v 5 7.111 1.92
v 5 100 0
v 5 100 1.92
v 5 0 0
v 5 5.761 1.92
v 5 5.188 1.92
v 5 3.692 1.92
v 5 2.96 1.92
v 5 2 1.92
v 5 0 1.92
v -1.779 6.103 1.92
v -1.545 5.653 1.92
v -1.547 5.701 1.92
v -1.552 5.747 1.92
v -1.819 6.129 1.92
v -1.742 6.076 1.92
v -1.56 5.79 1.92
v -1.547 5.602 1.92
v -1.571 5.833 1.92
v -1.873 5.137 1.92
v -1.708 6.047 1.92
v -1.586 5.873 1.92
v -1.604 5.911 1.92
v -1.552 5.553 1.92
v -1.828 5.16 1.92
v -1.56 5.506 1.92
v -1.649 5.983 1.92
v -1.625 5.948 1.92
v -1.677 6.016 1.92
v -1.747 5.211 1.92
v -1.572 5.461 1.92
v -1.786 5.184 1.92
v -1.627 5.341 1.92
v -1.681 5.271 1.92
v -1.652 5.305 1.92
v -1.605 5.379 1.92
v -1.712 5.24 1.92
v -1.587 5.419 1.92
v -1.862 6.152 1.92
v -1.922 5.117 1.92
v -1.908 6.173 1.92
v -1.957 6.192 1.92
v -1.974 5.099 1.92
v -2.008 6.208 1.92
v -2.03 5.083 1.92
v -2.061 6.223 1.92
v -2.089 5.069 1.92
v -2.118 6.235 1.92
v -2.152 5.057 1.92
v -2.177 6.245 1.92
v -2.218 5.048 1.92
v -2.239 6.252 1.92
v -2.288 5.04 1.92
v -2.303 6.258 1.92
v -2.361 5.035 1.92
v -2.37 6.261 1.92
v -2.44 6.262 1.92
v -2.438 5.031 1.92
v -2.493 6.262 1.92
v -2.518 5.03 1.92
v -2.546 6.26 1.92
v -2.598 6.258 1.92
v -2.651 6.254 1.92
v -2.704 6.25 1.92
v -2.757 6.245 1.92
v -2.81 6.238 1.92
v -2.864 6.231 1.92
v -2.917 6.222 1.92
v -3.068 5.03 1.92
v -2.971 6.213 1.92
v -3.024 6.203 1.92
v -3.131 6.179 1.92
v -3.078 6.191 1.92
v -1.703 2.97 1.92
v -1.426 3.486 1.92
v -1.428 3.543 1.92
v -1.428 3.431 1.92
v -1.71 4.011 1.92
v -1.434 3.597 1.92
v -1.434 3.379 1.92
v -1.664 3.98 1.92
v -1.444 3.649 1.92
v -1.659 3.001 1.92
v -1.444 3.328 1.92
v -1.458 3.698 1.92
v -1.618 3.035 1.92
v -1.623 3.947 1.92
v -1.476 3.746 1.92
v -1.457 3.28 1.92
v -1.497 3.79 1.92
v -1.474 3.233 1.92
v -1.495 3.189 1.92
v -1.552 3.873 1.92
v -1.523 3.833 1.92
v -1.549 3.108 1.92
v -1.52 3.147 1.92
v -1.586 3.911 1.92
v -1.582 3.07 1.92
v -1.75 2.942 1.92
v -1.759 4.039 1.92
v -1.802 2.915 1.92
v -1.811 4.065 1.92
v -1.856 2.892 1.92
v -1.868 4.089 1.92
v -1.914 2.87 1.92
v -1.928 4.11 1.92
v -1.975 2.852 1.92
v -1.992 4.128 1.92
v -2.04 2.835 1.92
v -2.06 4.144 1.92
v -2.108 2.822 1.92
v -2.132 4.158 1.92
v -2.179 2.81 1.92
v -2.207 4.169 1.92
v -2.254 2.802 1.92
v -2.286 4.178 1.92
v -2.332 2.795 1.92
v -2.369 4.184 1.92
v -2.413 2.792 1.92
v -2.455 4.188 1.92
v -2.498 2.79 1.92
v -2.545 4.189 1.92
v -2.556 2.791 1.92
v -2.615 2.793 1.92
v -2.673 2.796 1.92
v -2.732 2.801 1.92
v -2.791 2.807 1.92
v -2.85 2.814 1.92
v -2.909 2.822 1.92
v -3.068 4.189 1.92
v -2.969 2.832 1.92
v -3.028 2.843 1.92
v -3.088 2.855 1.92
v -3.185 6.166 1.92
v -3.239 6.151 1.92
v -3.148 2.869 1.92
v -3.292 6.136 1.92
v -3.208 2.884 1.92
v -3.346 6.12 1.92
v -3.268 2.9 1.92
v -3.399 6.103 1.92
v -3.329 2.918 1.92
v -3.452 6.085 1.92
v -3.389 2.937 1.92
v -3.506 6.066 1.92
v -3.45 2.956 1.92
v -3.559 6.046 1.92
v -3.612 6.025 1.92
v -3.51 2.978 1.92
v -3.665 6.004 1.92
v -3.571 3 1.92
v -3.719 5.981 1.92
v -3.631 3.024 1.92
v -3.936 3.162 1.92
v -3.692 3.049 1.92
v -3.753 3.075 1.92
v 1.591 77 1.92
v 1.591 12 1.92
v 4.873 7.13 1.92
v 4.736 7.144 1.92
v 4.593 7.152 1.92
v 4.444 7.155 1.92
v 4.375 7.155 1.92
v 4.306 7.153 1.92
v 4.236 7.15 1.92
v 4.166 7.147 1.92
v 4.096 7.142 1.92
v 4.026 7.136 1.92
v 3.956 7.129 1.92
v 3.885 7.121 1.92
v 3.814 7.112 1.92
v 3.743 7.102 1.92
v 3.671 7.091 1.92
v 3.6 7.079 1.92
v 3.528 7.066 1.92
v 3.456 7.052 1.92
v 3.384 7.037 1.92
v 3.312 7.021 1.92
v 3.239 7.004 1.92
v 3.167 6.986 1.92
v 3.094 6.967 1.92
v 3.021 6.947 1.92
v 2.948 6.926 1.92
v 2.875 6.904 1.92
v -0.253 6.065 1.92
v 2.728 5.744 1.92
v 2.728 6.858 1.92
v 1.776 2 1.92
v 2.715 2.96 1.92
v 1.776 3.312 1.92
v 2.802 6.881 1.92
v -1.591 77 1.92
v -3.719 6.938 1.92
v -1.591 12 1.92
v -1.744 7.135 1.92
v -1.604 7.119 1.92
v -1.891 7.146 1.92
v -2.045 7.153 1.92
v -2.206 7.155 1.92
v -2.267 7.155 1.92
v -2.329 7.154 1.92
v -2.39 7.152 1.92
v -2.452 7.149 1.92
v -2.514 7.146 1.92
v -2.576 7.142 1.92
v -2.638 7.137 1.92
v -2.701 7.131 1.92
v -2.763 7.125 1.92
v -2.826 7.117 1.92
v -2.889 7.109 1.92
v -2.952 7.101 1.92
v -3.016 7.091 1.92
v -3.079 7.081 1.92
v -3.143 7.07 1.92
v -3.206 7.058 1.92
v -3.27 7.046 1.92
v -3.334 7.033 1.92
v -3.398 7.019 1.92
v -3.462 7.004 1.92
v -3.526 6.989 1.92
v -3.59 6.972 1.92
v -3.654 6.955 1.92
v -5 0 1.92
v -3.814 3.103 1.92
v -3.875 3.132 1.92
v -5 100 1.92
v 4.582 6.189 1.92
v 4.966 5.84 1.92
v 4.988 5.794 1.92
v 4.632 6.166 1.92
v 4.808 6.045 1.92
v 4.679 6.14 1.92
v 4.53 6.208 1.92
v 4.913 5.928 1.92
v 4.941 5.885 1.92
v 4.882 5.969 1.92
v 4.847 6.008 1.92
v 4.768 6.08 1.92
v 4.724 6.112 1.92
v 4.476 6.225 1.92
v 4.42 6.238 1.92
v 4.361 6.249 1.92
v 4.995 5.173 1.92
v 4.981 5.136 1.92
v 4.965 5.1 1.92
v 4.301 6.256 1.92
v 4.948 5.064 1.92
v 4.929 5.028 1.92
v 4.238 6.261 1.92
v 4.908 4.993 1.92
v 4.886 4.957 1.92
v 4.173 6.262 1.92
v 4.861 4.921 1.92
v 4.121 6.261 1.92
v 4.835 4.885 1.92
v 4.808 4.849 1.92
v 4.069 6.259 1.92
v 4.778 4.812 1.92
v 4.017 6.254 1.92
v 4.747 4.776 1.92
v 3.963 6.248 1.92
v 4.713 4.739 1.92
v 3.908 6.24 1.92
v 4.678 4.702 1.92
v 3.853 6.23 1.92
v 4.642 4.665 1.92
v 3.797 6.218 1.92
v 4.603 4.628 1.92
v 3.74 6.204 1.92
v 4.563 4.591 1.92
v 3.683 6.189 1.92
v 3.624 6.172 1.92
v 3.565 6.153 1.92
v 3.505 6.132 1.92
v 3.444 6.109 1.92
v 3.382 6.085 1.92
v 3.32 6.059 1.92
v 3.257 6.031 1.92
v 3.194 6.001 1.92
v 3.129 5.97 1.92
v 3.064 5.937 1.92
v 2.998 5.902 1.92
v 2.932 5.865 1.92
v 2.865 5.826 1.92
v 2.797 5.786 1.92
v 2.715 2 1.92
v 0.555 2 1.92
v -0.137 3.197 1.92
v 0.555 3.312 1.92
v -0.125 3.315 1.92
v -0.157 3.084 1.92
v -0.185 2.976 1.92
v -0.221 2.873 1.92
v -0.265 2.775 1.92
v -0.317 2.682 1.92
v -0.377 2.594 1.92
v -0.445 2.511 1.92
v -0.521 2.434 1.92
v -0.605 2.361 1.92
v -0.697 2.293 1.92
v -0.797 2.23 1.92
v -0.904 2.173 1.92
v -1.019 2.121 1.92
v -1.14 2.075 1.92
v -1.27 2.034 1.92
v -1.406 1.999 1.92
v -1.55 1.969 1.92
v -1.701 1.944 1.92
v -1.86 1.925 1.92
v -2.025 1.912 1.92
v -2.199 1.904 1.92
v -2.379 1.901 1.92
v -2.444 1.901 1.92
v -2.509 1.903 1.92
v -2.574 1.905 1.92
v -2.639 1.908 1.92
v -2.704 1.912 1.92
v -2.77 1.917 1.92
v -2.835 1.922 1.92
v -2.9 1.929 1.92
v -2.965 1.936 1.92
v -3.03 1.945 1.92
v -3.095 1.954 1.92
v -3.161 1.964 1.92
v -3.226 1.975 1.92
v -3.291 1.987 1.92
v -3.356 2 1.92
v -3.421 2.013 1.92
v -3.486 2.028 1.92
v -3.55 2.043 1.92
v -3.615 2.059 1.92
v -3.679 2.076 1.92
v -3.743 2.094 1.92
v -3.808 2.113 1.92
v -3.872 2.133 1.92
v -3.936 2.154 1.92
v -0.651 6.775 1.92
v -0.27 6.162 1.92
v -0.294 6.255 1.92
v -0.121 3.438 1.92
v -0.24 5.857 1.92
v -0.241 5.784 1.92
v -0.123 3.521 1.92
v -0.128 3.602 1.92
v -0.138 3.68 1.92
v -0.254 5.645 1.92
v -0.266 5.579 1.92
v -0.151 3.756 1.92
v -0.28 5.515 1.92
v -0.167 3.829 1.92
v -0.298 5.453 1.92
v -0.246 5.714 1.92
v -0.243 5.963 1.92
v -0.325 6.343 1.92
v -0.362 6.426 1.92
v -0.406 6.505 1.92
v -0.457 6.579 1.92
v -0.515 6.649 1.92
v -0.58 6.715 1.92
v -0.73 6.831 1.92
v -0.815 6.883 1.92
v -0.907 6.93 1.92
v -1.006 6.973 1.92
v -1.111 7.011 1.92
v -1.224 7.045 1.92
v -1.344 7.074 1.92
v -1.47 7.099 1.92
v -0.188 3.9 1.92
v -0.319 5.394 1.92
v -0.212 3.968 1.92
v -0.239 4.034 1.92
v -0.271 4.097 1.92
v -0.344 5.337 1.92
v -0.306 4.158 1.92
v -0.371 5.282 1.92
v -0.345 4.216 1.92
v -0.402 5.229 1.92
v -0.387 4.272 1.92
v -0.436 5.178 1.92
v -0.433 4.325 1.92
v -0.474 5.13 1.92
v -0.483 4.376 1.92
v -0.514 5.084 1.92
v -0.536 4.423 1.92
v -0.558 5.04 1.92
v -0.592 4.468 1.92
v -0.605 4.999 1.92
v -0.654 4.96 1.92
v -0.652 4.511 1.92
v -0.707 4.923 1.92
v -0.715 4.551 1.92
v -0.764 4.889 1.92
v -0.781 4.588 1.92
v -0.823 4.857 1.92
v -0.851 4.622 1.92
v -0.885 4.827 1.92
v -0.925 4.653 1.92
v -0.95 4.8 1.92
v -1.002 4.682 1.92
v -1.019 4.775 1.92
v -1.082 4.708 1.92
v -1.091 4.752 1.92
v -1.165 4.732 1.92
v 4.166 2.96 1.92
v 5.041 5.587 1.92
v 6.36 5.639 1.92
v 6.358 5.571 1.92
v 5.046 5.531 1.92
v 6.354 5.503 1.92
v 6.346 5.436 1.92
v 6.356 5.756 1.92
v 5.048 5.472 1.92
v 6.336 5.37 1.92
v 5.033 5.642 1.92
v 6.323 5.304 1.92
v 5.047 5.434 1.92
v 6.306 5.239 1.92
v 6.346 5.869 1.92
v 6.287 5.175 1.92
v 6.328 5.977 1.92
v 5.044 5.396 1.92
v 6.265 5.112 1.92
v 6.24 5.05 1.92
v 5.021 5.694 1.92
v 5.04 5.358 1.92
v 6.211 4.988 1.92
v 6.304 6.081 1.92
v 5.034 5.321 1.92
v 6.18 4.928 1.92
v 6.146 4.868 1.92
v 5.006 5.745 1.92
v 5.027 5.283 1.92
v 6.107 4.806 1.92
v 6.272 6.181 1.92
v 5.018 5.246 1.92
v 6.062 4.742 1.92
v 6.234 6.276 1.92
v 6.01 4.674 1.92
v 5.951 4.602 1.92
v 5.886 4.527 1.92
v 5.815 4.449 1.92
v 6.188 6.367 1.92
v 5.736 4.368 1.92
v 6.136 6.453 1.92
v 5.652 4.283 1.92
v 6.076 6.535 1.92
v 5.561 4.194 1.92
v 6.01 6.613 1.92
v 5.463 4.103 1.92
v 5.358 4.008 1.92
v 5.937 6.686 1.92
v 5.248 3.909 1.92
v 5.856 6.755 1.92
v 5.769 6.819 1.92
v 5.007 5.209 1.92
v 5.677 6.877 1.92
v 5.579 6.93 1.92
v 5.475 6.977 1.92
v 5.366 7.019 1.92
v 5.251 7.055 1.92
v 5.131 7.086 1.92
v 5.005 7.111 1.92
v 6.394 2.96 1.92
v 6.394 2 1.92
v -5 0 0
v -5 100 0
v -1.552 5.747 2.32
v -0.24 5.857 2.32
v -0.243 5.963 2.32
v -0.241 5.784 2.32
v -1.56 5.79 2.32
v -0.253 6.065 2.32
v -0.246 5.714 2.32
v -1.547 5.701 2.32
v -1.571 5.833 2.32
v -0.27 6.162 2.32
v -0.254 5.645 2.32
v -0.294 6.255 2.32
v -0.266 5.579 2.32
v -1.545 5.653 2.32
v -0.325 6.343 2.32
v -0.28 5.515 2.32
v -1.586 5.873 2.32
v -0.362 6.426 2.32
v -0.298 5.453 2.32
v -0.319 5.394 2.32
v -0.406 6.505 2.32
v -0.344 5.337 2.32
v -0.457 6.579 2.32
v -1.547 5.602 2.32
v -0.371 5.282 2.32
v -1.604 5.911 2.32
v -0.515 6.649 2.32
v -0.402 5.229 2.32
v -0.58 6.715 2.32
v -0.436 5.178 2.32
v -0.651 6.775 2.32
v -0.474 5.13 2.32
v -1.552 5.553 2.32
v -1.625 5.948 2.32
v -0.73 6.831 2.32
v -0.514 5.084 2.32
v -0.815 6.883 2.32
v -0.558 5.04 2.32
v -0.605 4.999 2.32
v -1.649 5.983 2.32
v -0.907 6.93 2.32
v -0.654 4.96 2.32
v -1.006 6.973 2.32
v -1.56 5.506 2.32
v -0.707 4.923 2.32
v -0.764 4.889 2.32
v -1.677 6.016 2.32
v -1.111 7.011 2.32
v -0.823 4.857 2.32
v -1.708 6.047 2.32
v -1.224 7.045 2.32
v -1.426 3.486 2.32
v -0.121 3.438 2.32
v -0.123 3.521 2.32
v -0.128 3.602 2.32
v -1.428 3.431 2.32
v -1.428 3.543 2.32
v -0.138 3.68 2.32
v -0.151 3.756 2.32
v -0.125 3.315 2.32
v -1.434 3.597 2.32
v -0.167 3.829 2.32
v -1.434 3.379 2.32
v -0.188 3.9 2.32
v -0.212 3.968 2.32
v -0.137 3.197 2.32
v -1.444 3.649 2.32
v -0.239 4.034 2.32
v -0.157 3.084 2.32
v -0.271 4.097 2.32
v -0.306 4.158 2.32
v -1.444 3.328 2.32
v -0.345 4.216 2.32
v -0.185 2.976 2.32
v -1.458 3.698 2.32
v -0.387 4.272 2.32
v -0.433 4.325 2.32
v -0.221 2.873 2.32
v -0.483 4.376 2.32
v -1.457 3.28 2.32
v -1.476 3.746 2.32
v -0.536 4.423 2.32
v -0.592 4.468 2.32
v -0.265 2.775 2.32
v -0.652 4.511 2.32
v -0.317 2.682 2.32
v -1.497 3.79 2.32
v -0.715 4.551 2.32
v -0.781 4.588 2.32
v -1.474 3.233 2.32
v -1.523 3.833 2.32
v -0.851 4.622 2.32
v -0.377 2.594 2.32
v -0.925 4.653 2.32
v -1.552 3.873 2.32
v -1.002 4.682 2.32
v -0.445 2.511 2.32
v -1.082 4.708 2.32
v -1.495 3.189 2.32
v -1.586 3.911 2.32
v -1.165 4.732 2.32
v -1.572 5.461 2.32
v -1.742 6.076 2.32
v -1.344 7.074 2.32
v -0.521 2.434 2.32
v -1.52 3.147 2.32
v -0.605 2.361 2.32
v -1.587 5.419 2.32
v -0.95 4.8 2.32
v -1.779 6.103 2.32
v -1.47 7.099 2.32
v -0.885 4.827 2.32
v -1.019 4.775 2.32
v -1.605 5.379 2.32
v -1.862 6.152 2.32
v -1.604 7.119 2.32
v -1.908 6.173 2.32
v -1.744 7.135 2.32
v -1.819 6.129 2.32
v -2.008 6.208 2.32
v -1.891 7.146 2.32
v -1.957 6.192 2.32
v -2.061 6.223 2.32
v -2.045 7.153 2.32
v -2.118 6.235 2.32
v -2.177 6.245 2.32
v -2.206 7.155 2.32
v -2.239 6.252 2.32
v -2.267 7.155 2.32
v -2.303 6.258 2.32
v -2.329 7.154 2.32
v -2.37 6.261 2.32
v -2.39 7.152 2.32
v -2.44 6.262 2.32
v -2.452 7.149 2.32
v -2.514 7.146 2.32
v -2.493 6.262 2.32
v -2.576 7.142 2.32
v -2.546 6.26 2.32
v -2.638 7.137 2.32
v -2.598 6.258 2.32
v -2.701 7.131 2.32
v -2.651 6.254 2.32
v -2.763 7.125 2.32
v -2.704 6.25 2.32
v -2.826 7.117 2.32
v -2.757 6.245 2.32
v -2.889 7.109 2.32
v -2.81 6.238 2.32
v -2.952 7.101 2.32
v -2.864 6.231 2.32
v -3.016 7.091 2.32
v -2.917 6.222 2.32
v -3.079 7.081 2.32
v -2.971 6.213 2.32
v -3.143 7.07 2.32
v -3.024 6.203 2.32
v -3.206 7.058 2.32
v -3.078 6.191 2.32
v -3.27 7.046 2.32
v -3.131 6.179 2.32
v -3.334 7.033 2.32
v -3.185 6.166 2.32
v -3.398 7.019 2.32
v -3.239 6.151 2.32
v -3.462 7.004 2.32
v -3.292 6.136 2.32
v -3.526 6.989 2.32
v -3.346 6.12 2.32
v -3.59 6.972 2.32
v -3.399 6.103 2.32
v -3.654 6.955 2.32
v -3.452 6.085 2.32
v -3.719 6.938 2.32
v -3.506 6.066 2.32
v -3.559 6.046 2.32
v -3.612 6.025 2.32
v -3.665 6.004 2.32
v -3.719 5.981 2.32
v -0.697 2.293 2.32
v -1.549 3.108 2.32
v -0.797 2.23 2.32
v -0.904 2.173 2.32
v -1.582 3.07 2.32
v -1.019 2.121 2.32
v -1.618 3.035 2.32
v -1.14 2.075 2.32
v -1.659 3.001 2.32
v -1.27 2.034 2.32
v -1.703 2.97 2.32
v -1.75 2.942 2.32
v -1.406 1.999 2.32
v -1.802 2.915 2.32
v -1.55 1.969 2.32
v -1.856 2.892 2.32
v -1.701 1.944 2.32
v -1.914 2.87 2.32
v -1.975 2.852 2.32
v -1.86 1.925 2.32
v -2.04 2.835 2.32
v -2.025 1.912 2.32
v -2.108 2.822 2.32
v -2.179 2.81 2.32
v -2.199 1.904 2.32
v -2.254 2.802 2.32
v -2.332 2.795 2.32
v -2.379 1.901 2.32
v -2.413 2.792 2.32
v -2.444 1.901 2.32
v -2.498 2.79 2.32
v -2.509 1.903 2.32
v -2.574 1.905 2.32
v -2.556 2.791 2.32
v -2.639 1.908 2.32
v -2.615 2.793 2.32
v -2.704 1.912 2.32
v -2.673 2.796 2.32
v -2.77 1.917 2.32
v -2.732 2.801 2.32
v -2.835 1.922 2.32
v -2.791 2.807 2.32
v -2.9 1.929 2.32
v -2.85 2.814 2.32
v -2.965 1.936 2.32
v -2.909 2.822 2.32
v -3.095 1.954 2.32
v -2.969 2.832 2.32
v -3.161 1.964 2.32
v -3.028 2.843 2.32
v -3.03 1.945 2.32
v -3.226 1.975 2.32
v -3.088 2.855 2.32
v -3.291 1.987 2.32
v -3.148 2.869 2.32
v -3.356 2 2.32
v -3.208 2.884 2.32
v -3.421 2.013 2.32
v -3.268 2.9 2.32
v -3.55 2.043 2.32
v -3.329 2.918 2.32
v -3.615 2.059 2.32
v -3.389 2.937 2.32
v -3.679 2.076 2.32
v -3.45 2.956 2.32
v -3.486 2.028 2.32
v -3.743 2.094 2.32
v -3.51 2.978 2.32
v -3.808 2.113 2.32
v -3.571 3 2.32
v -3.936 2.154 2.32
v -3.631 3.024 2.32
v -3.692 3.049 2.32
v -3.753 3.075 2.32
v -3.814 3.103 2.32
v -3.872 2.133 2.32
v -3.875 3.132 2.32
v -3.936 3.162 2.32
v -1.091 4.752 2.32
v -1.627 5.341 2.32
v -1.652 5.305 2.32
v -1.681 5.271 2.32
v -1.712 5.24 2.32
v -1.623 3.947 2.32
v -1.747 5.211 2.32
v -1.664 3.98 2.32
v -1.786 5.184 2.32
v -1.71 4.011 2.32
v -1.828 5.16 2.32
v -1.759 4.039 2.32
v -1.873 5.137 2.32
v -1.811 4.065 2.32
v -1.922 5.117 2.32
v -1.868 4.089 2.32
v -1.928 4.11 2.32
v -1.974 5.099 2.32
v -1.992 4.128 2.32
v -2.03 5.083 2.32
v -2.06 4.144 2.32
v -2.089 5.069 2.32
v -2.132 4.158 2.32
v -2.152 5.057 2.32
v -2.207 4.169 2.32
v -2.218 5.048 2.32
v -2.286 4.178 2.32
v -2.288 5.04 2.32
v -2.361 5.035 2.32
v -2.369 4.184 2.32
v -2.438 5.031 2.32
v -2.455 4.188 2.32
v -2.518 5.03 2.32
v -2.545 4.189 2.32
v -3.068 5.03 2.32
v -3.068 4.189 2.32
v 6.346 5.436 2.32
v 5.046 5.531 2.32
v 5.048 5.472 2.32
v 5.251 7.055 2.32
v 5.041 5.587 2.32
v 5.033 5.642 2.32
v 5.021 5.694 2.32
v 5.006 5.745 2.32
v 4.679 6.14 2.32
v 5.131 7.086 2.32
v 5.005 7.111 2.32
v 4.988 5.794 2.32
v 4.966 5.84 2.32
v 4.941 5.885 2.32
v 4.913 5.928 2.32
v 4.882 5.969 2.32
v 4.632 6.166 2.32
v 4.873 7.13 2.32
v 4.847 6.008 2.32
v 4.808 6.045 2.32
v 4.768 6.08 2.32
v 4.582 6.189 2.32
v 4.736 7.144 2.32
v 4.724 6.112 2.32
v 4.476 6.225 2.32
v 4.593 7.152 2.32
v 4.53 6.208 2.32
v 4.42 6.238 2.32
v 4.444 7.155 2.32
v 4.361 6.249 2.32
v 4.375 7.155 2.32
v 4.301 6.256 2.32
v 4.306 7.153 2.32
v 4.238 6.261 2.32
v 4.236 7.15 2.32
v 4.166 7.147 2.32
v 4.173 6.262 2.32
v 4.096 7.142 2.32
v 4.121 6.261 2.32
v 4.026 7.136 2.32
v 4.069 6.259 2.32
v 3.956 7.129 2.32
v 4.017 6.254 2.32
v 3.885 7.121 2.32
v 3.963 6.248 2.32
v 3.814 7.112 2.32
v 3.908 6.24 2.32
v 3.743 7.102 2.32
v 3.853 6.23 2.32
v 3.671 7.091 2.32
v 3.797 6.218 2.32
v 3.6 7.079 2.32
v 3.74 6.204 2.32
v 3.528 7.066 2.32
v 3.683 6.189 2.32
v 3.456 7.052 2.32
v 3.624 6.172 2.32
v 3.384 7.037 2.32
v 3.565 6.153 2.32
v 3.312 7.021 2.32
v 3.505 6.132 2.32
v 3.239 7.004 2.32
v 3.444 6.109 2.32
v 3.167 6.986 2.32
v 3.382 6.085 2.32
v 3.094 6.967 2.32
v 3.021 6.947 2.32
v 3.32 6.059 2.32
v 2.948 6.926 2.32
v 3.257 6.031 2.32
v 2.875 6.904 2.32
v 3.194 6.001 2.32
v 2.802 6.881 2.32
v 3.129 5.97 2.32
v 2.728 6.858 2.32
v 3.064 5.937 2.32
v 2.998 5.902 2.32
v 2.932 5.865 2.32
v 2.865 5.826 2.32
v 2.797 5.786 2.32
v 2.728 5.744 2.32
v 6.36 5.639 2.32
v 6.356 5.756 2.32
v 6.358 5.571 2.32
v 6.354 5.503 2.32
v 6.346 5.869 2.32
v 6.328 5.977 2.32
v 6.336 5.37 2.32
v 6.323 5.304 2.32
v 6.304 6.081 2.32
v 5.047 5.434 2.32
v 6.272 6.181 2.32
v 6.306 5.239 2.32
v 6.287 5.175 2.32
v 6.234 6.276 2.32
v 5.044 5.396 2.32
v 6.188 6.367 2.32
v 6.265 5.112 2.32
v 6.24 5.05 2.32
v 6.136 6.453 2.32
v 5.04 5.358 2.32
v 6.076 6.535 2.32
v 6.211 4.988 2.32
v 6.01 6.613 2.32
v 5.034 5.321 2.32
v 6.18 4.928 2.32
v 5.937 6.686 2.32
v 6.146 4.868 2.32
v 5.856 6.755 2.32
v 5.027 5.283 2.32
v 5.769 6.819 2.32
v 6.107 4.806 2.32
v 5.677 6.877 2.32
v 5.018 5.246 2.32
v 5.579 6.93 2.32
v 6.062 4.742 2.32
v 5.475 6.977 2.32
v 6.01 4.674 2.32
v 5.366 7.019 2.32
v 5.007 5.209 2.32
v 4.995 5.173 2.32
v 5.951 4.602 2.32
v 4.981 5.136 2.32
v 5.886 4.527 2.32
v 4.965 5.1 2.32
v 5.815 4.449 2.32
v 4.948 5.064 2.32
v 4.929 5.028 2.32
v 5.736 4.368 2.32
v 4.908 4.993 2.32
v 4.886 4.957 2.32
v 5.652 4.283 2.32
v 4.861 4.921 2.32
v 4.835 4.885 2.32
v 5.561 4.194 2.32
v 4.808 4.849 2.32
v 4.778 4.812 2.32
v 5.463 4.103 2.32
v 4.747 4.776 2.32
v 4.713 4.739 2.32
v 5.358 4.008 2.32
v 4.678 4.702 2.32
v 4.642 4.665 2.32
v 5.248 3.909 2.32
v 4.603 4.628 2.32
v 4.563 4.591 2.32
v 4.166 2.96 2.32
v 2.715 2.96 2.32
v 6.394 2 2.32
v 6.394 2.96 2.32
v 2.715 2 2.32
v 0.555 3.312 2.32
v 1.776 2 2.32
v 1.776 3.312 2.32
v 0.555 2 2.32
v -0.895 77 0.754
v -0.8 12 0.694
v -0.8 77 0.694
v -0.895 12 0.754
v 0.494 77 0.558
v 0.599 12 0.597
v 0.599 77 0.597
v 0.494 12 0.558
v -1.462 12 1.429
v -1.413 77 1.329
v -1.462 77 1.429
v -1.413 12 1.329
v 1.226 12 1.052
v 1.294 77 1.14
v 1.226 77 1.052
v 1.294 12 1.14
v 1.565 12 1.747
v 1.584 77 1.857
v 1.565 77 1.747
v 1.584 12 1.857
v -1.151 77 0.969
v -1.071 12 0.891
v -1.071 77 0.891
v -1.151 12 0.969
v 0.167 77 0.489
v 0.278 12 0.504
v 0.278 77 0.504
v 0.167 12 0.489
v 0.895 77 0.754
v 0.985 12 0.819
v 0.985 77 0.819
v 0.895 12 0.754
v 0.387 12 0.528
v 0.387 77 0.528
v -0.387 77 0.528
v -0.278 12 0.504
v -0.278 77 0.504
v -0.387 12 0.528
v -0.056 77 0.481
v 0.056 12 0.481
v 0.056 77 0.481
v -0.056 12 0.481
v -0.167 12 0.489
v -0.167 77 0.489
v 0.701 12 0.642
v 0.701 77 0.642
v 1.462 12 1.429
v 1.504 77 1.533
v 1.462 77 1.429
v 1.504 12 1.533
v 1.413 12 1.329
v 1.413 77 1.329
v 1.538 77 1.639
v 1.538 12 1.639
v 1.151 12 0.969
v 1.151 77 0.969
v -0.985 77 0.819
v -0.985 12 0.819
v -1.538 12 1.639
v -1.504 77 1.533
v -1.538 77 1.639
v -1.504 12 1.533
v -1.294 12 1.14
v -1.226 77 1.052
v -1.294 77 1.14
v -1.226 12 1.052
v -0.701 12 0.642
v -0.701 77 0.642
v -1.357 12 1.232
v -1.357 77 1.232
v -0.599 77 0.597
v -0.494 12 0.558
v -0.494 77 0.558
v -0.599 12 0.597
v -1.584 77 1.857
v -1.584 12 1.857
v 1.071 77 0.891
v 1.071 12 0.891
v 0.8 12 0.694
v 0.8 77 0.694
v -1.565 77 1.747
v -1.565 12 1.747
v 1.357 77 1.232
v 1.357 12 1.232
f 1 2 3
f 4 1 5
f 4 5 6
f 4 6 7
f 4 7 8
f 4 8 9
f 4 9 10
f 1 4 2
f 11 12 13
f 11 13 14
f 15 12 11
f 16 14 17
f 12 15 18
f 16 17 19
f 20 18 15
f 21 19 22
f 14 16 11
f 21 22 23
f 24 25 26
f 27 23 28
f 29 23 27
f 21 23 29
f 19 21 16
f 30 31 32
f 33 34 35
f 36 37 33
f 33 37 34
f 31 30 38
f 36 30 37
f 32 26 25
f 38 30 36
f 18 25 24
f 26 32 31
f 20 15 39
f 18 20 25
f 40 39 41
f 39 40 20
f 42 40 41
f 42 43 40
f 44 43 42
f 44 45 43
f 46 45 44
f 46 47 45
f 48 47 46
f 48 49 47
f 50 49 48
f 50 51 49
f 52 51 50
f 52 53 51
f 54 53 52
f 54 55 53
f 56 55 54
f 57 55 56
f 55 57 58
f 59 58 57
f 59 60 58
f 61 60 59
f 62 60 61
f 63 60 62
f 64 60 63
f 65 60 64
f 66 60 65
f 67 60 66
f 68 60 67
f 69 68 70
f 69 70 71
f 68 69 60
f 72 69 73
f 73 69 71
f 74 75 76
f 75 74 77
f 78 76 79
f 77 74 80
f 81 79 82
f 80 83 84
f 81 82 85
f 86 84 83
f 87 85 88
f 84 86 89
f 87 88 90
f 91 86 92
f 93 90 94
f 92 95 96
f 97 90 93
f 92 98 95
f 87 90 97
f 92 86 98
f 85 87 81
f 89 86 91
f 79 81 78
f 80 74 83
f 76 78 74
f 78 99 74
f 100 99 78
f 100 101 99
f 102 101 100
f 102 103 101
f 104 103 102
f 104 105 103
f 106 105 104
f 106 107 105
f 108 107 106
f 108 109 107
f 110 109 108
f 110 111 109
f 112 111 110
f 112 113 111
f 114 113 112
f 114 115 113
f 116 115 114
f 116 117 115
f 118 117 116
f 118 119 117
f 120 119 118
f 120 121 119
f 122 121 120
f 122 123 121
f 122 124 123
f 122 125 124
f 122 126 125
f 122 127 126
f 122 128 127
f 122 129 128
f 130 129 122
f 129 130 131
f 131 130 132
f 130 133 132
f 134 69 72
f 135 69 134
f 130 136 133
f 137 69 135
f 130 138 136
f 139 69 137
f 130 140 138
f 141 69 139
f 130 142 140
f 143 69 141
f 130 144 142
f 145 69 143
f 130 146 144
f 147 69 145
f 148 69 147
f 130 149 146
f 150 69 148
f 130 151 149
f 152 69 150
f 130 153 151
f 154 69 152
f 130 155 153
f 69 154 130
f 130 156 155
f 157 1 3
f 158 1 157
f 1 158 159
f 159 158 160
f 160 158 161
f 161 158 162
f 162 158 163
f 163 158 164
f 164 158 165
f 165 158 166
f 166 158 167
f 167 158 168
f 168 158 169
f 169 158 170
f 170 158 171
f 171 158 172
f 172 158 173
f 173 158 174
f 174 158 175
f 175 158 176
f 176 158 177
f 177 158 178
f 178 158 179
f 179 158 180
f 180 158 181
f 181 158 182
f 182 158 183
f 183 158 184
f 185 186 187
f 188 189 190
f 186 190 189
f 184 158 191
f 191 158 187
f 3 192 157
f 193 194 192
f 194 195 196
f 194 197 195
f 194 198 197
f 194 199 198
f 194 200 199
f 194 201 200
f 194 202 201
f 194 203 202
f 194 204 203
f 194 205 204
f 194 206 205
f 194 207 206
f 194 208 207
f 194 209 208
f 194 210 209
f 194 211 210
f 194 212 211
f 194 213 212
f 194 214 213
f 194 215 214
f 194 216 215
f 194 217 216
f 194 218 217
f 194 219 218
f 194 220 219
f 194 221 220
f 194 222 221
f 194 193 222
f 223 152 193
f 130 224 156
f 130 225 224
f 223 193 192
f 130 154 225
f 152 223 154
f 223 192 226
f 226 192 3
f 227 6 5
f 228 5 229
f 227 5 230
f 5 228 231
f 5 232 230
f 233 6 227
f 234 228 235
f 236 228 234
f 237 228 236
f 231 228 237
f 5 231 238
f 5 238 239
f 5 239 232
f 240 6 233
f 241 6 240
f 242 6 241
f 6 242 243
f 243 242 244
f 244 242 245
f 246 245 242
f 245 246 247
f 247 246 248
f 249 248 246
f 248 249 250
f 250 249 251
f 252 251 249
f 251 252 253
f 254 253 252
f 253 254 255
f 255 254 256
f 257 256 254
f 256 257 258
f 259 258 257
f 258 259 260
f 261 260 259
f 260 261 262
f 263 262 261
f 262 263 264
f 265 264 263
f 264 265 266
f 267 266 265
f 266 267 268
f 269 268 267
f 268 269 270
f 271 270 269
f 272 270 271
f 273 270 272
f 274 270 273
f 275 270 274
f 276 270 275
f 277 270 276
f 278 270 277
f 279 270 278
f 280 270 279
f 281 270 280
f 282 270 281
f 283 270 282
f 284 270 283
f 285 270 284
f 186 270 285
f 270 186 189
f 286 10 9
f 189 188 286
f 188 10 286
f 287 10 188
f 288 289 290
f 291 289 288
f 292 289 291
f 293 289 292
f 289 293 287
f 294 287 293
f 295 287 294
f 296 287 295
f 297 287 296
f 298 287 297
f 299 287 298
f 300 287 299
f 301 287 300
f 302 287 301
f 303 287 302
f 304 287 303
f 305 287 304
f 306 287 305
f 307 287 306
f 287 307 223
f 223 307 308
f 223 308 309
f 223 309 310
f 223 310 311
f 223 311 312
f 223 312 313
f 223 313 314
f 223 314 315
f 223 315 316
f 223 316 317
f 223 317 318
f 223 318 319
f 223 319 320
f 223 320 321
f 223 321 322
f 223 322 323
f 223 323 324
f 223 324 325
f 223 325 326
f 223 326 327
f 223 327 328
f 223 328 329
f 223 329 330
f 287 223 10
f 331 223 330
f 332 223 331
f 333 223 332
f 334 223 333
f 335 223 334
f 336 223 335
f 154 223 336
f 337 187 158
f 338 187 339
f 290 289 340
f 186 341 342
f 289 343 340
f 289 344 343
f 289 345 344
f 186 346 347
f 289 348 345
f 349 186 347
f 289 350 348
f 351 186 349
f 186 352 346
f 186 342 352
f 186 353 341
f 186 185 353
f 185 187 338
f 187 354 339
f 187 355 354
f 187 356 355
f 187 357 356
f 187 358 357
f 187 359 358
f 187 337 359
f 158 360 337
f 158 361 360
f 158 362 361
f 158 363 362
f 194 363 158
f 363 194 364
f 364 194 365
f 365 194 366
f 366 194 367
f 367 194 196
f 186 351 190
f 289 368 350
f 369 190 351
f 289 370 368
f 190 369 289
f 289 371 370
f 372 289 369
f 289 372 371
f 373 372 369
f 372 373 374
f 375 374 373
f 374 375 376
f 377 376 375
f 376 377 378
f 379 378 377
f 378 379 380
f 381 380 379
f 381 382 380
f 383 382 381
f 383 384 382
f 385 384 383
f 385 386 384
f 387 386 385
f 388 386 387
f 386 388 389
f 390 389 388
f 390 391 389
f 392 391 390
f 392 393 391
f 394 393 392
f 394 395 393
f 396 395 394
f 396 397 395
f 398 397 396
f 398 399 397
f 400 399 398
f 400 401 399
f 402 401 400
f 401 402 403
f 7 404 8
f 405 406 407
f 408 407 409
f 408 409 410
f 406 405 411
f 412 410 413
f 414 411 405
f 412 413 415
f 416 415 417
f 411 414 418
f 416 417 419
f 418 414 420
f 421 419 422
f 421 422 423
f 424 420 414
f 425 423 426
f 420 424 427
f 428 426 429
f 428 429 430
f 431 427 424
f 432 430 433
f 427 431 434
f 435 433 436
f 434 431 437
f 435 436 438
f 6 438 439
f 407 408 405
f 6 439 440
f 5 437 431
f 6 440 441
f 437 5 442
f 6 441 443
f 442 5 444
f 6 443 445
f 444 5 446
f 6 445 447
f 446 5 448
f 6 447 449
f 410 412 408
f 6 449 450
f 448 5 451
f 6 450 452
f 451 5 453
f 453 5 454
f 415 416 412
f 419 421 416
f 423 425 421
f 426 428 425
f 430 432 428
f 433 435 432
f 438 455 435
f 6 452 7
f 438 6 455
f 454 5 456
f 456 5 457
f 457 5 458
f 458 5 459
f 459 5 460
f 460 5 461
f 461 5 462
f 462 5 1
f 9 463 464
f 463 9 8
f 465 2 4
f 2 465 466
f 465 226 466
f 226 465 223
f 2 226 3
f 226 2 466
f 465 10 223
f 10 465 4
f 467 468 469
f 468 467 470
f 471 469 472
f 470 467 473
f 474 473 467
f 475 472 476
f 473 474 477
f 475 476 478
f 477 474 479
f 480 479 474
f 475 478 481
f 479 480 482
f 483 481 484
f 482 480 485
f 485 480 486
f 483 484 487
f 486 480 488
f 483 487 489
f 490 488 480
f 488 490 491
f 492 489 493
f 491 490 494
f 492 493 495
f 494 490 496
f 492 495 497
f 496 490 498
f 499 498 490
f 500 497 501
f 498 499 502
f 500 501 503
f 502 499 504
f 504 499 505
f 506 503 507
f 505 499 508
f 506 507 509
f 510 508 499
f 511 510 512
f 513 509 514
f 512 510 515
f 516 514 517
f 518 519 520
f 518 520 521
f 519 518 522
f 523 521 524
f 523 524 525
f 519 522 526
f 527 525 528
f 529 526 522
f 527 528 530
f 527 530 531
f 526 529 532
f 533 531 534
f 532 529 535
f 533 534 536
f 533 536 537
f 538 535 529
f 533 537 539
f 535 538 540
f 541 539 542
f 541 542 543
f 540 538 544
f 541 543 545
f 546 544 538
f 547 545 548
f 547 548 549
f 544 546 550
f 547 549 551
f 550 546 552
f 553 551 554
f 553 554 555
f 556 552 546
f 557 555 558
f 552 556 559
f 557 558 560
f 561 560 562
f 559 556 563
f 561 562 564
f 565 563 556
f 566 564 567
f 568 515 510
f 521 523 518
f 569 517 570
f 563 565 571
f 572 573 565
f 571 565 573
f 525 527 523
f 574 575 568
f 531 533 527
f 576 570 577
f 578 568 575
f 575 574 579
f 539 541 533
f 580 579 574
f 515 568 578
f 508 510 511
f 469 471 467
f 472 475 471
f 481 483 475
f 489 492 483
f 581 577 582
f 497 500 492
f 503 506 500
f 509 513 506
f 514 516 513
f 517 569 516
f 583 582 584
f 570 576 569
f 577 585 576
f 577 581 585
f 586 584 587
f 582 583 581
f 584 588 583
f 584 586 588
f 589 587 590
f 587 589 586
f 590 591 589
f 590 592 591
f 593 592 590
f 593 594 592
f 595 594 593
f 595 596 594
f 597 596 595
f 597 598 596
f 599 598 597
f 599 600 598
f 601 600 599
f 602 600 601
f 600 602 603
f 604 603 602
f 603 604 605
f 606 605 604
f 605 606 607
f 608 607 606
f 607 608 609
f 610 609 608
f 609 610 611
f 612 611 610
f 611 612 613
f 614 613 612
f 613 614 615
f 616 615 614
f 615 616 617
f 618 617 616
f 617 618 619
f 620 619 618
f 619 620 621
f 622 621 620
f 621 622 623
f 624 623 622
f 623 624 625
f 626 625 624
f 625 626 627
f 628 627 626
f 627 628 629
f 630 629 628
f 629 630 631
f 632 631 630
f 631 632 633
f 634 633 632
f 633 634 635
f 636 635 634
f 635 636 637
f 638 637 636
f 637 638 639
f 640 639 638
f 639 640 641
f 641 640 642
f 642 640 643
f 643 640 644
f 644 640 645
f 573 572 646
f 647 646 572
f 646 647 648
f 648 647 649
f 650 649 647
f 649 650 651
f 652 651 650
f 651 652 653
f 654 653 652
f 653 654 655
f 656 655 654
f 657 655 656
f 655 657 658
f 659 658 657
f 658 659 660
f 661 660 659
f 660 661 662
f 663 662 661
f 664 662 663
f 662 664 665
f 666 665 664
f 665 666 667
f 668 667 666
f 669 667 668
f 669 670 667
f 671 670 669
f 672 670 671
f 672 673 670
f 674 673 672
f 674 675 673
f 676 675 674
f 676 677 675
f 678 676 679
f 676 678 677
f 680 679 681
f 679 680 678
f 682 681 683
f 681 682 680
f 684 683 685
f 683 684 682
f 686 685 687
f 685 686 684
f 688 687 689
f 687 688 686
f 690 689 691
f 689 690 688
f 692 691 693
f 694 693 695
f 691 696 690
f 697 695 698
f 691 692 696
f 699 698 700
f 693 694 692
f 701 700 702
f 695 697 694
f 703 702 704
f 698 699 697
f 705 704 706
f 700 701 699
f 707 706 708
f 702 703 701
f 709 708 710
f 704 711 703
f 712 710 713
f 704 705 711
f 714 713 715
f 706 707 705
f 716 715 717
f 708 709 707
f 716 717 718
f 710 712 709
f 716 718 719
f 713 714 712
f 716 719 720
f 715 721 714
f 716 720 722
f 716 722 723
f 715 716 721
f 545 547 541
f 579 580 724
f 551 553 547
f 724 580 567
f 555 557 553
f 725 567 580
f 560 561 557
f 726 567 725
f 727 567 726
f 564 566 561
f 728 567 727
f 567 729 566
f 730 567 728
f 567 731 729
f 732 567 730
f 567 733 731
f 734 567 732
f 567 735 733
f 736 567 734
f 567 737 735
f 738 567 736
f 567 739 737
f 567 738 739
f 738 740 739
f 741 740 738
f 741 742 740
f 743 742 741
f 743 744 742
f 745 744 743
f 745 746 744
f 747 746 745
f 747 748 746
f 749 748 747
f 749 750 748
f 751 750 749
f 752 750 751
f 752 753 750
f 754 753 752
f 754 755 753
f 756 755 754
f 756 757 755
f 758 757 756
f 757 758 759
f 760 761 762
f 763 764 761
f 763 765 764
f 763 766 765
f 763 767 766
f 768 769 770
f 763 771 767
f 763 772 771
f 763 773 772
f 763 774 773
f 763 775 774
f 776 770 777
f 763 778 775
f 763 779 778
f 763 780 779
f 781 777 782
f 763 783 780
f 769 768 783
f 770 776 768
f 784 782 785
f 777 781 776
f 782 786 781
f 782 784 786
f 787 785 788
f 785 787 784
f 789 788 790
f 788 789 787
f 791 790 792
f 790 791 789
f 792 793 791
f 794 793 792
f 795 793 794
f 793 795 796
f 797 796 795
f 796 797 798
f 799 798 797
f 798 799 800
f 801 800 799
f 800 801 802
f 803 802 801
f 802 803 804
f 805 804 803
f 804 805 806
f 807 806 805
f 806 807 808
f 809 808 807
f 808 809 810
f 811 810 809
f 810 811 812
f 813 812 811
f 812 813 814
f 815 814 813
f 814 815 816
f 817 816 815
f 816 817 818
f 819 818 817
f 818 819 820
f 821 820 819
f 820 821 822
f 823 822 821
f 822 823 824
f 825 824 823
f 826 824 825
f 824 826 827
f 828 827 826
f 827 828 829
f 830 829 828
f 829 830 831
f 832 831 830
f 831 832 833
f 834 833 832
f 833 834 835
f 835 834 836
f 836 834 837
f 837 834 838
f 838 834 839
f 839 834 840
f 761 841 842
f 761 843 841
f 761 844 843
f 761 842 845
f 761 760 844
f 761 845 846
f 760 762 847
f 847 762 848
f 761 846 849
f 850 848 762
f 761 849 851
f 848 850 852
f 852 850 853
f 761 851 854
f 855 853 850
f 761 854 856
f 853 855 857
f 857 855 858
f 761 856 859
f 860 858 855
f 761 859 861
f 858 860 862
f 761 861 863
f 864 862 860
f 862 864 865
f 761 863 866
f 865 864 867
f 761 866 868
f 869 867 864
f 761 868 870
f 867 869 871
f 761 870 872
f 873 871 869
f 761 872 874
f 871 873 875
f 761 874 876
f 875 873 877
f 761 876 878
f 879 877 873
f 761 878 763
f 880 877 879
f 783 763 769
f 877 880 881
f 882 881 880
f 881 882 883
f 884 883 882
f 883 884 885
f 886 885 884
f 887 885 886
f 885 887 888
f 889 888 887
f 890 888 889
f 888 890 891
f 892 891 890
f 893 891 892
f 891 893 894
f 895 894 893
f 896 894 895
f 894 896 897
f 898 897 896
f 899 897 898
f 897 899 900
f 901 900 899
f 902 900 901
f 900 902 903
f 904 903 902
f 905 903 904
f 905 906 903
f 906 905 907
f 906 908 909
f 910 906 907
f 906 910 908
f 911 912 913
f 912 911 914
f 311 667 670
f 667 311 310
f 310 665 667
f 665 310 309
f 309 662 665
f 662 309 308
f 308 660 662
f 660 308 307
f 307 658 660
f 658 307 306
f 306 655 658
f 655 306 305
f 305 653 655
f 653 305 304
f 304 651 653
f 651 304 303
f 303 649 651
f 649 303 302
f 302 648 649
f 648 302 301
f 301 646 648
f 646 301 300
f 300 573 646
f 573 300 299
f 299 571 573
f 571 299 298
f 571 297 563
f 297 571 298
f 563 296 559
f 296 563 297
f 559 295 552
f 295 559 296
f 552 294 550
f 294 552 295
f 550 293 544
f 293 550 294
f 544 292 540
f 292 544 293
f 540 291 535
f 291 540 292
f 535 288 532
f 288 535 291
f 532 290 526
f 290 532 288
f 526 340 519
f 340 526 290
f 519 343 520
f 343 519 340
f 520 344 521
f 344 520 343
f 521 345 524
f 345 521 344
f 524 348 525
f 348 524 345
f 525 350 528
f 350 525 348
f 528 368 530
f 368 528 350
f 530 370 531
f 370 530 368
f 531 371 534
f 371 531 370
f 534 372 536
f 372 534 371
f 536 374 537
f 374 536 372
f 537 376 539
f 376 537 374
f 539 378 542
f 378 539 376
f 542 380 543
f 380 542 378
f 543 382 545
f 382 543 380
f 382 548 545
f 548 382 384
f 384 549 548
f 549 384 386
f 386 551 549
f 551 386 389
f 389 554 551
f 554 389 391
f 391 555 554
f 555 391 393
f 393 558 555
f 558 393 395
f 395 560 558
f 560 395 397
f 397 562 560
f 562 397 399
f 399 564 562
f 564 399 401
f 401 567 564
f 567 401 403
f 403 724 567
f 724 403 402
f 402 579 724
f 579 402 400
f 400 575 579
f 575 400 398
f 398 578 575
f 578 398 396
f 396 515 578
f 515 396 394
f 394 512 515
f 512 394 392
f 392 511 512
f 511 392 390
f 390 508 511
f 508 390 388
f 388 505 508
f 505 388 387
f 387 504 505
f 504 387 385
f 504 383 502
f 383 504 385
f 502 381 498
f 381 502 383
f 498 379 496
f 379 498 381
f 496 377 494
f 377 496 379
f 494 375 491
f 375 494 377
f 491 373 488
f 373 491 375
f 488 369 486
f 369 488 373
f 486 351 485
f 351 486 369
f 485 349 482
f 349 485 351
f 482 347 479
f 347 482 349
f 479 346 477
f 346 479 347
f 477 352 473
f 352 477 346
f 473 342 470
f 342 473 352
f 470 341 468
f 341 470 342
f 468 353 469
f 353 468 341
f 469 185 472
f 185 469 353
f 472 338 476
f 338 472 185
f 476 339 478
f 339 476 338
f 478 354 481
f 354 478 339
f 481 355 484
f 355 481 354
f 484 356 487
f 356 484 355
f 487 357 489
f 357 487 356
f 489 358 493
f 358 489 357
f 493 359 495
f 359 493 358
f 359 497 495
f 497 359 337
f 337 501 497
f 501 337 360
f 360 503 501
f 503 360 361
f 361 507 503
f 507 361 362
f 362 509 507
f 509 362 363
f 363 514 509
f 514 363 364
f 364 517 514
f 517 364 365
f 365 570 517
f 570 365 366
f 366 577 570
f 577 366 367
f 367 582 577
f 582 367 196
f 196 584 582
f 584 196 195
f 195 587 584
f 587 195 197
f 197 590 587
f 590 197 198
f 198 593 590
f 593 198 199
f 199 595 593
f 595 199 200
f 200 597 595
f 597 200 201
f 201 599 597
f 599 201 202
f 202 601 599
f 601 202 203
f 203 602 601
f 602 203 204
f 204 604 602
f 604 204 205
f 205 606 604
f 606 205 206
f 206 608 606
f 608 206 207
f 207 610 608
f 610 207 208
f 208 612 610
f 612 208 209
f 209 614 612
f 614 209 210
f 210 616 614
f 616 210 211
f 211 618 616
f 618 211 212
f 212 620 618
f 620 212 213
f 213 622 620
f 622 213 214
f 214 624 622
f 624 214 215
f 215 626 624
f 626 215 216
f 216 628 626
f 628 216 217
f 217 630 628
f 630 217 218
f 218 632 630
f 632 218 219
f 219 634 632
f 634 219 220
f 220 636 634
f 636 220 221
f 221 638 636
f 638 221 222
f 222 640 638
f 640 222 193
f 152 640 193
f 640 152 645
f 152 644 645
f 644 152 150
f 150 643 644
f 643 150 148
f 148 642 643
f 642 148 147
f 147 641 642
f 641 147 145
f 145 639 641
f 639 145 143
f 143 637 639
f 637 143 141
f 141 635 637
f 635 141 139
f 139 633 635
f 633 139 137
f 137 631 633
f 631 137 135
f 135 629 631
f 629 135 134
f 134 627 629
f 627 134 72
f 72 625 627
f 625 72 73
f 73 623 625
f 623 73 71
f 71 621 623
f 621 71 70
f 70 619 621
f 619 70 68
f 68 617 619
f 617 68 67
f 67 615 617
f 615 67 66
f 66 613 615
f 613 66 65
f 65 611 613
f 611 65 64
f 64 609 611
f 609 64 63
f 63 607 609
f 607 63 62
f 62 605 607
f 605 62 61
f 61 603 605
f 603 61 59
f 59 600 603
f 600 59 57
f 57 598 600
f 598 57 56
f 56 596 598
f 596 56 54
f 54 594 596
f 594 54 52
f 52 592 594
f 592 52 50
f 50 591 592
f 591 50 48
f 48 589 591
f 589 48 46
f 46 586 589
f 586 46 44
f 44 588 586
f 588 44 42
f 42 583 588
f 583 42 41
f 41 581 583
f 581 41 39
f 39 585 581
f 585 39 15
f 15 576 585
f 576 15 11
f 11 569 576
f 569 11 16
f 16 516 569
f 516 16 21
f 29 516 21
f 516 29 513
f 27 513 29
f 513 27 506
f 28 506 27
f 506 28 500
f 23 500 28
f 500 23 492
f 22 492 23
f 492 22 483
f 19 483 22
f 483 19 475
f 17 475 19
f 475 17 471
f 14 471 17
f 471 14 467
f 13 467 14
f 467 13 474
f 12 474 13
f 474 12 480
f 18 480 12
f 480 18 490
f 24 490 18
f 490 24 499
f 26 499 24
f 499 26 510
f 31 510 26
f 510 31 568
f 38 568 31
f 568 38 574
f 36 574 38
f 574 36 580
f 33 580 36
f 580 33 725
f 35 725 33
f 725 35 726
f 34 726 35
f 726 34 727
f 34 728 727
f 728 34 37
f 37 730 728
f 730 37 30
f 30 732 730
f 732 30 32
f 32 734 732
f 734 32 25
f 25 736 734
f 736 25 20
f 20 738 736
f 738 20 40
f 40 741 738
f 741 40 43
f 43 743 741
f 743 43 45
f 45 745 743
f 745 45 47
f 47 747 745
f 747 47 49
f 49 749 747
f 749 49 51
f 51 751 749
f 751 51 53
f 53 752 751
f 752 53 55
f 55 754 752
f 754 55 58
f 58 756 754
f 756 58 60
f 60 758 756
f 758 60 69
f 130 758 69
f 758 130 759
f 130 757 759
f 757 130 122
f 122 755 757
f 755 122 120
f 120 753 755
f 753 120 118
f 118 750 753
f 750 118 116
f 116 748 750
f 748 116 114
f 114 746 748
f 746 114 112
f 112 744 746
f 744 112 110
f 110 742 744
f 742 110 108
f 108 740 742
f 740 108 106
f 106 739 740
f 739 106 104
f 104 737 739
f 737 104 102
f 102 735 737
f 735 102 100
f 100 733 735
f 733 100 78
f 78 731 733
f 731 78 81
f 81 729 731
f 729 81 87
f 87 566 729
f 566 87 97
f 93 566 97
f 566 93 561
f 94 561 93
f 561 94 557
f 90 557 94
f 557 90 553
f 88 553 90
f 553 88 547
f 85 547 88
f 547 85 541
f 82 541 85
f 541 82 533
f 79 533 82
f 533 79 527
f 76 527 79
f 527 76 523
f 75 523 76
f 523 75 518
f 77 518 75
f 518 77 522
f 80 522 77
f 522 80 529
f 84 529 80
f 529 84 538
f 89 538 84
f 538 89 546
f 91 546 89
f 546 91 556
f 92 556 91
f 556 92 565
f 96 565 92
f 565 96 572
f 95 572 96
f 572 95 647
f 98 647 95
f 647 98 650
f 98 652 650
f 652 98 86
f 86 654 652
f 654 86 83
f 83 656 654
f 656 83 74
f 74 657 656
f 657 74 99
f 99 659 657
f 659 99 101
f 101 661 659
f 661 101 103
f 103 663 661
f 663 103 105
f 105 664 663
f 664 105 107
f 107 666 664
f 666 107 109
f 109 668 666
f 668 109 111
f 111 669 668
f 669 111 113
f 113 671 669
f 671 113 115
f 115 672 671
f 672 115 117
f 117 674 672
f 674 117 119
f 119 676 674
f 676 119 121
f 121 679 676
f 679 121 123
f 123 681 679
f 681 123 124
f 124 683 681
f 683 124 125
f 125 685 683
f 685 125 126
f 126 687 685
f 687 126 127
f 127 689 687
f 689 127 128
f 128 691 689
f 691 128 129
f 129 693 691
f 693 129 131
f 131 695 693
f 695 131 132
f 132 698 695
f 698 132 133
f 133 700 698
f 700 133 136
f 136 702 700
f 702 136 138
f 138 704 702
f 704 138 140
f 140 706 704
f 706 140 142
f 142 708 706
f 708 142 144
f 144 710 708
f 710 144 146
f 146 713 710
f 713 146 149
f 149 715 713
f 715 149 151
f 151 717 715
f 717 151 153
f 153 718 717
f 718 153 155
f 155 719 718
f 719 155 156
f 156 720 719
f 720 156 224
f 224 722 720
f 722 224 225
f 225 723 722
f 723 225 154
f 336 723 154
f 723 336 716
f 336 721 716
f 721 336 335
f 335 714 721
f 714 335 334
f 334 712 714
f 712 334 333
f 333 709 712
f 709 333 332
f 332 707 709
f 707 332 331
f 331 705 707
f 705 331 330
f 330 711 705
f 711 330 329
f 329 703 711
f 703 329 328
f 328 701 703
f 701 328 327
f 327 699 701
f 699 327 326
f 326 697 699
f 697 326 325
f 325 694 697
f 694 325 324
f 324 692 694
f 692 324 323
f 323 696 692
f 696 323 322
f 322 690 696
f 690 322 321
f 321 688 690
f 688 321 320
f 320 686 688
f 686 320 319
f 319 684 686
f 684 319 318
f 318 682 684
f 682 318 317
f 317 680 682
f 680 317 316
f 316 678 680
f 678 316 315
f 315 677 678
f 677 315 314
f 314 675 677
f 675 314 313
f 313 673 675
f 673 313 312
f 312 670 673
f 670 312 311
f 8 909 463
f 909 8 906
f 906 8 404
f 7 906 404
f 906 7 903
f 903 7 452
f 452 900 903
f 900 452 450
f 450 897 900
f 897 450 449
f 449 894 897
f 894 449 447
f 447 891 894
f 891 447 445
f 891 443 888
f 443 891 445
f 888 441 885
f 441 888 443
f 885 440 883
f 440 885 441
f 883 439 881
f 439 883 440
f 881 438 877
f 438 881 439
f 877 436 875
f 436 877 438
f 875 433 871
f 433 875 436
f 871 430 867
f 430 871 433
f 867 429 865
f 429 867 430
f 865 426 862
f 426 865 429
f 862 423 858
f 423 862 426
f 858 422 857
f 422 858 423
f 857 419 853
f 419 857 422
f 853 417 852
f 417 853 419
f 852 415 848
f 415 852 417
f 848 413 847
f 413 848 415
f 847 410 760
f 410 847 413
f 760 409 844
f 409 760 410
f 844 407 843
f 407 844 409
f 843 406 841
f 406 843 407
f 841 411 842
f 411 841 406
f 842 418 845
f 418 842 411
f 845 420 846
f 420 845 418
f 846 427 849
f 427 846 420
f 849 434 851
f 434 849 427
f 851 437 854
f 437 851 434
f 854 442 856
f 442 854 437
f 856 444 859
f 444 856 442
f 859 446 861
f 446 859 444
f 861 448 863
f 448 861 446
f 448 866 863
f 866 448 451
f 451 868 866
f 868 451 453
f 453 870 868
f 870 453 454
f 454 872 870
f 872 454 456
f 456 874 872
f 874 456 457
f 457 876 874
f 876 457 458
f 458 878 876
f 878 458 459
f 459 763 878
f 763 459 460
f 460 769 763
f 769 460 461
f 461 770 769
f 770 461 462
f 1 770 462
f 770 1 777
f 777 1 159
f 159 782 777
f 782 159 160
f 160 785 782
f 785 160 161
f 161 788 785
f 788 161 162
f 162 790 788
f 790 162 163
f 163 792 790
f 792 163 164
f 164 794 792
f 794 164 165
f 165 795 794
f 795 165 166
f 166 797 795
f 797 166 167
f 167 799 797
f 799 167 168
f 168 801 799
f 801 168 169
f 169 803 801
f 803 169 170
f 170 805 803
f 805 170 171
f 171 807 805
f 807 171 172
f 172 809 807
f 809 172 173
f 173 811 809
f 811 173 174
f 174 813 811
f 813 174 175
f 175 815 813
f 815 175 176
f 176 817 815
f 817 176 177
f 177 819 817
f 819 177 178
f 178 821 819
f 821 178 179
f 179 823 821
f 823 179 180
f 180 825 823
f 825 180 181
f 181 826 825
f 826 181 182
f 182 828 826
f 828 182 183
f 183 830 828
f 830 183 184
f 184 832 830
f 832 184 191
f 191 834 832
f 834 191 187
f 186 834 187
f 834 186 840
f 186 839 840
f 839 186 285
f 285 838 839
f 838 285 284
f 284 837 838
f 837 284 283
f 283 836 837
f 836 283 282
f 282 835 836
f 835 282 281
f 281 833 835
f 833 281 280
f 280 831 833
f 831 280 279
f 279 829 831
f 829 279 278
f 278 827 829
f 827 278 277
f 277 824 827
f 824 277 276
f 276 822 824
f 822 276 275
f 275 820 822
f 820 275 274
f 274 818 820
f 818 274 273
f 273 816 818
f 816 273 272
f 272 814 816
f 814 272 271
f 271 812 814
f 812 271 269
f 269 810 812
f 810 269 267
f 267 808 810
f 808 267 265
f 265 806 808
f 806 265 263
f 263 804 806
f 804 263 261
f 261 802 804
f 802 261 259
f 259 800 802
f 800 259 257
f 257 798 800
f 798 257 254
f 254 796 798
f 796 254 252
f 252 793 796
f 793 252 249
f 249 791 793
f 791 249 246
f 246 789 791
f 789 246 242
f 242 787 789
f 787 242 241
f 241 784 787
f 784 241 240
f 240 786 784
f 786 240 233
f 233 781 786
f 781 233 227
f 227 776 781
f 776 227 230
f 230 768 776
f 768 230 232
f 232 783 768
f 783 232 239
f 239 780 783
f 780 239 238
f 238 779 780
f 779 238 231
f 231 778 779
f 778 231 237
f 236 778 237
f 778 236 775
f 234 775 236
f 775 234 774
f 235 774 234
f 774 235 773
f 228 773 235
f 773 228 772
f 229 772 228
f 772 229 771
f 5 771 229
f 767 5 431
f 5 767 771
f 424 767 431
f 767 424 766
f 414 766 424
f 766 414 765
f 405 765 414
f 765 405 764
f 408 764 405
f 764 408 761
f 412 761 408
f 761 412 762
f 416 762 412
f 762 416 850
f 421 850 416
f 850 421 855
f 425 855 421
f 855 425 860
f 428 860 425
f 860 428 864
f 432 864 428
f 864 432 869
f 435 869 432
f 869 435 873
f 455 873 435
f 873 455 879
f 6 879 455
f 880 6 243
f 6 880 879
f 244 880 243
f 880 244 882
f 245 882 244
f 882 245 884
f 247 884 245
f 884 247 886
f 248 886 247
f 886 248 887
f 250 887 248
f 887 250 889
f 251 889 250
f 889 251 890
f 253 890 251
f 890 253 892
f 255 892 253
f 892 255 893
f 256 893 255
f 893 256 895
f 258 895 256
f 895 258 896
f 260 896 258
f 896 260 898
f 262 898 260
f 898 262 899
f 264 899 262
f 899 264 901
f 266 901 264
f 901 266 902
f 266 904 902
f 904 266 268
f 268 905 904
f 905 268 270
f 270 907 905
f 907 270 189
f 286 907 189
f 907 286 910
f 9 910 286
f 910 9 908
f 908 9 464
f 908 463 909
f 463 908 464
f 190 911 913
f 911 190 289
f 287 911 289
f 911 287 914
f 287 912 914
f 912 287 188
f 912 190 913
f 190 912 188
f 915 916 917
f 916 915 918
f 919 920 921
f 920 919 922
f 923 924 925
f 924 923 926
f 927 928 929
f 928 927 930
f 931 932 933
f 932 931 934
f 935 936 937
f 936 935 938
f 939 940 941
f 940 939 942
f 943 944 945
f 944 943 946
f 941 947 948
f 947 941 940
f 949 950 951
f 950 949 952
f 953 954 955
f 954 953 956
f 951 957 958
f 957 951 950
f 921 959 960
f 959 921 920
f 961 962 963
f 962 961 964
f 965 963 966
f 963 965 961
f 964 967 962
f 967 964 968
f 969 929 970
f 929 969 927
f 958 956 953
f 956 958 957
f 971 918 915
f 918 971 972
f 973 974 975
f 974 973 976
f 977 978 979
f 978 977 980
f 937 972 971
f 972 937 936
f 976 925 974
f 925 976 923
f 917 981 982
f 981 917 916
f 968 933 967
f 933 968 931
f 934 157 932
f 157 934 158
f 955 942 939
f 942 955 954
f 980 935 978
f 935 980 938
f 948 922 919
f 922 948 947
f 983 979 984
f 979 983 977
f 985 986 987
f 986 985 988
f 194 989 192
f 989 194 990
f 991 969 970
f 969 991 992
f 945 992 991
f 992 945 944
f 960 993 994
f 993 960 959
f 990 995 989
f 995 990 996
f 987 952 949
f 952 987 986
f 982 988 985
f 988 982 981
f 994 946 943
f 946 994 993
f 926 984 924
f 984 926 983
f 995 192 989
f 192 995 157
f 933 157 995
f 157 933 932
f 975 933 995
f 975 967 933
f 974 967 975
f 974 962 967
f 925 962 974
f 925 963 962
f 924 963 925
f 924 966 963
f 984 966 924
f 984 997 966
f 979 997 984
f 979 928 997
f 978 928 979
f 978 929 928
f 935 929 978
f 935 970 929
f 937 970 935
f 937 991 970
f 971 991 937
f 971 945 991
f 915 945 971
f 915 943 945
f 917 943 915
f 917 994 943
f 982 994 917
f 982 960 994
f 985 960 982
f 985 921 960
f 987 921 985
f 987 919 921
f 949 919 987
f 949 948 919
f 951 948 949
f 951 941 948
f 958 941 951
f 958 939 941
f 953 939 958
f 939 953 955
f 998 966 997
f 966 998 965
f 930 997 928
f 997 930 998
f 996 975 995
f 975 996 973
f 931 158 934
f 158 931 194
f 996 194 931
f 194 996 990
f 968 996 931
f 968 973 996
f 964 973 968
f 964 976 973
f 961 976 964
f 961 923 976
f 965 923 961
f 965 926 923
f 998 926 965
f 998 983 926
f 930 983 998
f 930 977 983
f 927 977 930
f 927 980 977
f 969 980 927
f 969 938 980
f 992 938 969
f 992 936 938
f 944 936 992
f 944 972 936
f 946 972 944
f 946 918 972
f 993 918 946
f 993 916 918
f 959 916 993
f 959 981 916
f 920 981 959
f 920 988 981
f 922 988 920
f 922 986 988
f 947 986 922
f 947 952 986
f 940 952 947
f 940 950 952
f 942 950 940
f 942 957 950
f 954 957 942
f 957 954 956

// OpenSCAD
// file: module/drill-bit-storage.scad
/*
    Drill bit storage
*/

$fn=90;  // accuracy


// Constants (Don't change)
storageLenght = 100; // Not Bit lenght
maxBitLenght  = 70;  // Check bit lenght
storageWidth  = 10;  // Minimum width

// Bit dependent
bitDiameter = 4.0;



module drillBitStorage (bitDiameter,maxBitLenght,
	storageWidth,storageLenght){

// Automatic Variables  (Don't change)
diameterText      = str(bitDiameter);
storageHight      = bitDiameter*0.6; 
bitRadius         = bitDiameter/2;
bitPositionHeight = storageHight+bitDiameter*0.05; 


// Delition for crating drill track
difference() {

// Union for text and storage
union(){

// Storage 
translate([
    -storageWidth/2,    // Centering
    0, 
    0
    ]) 
cube(size = [
    storageWidth,
    storageLenght,
    storageHight
    ]);

// Milimiter dimension text
translate([
    -4.4,               // Fine deling x-axis
    2,                  // Fine deling y-axis 
    storageHight         
    ])
linear_extrude(height=0.4)text(
    diameterText,  // Dynamic text
    size=5,
    font="tohoma:style=bold",
    spacing=0.9
    );
    
// End of union    
}  

// Begining of Delition
// Drill tracl
rotate([90,0,0])
translate([
    0,                   // x-axis
    bitPositionHeight,   // Z-axis
    -(maxBitLenght+12)    // y-axis
    ])  
cylinder(
    h = maxBitLenght,    // y-axis
    r = bitRadius        // x-axis 
    );      

// End of Delition
}}
// main file
/*
    Drill bit storage
*/

$fn=90;  // accuracy

// import module
use <module/drill-bit-storage.scad>;



// Tootale lenght of the unit
storageLenght = 100; 

// Width of the unit
storageWidth  = 10;  // (Constant under 4mm)  

// The lenght of the drill bit
maxBitLenght  = 65;  

// Drill bit diameter  
bitDiameter = 3.2;


// Call the module
drillBitStorage 
    (bitDiameter,maxBitLenght,storageWidth,storageLenght);
